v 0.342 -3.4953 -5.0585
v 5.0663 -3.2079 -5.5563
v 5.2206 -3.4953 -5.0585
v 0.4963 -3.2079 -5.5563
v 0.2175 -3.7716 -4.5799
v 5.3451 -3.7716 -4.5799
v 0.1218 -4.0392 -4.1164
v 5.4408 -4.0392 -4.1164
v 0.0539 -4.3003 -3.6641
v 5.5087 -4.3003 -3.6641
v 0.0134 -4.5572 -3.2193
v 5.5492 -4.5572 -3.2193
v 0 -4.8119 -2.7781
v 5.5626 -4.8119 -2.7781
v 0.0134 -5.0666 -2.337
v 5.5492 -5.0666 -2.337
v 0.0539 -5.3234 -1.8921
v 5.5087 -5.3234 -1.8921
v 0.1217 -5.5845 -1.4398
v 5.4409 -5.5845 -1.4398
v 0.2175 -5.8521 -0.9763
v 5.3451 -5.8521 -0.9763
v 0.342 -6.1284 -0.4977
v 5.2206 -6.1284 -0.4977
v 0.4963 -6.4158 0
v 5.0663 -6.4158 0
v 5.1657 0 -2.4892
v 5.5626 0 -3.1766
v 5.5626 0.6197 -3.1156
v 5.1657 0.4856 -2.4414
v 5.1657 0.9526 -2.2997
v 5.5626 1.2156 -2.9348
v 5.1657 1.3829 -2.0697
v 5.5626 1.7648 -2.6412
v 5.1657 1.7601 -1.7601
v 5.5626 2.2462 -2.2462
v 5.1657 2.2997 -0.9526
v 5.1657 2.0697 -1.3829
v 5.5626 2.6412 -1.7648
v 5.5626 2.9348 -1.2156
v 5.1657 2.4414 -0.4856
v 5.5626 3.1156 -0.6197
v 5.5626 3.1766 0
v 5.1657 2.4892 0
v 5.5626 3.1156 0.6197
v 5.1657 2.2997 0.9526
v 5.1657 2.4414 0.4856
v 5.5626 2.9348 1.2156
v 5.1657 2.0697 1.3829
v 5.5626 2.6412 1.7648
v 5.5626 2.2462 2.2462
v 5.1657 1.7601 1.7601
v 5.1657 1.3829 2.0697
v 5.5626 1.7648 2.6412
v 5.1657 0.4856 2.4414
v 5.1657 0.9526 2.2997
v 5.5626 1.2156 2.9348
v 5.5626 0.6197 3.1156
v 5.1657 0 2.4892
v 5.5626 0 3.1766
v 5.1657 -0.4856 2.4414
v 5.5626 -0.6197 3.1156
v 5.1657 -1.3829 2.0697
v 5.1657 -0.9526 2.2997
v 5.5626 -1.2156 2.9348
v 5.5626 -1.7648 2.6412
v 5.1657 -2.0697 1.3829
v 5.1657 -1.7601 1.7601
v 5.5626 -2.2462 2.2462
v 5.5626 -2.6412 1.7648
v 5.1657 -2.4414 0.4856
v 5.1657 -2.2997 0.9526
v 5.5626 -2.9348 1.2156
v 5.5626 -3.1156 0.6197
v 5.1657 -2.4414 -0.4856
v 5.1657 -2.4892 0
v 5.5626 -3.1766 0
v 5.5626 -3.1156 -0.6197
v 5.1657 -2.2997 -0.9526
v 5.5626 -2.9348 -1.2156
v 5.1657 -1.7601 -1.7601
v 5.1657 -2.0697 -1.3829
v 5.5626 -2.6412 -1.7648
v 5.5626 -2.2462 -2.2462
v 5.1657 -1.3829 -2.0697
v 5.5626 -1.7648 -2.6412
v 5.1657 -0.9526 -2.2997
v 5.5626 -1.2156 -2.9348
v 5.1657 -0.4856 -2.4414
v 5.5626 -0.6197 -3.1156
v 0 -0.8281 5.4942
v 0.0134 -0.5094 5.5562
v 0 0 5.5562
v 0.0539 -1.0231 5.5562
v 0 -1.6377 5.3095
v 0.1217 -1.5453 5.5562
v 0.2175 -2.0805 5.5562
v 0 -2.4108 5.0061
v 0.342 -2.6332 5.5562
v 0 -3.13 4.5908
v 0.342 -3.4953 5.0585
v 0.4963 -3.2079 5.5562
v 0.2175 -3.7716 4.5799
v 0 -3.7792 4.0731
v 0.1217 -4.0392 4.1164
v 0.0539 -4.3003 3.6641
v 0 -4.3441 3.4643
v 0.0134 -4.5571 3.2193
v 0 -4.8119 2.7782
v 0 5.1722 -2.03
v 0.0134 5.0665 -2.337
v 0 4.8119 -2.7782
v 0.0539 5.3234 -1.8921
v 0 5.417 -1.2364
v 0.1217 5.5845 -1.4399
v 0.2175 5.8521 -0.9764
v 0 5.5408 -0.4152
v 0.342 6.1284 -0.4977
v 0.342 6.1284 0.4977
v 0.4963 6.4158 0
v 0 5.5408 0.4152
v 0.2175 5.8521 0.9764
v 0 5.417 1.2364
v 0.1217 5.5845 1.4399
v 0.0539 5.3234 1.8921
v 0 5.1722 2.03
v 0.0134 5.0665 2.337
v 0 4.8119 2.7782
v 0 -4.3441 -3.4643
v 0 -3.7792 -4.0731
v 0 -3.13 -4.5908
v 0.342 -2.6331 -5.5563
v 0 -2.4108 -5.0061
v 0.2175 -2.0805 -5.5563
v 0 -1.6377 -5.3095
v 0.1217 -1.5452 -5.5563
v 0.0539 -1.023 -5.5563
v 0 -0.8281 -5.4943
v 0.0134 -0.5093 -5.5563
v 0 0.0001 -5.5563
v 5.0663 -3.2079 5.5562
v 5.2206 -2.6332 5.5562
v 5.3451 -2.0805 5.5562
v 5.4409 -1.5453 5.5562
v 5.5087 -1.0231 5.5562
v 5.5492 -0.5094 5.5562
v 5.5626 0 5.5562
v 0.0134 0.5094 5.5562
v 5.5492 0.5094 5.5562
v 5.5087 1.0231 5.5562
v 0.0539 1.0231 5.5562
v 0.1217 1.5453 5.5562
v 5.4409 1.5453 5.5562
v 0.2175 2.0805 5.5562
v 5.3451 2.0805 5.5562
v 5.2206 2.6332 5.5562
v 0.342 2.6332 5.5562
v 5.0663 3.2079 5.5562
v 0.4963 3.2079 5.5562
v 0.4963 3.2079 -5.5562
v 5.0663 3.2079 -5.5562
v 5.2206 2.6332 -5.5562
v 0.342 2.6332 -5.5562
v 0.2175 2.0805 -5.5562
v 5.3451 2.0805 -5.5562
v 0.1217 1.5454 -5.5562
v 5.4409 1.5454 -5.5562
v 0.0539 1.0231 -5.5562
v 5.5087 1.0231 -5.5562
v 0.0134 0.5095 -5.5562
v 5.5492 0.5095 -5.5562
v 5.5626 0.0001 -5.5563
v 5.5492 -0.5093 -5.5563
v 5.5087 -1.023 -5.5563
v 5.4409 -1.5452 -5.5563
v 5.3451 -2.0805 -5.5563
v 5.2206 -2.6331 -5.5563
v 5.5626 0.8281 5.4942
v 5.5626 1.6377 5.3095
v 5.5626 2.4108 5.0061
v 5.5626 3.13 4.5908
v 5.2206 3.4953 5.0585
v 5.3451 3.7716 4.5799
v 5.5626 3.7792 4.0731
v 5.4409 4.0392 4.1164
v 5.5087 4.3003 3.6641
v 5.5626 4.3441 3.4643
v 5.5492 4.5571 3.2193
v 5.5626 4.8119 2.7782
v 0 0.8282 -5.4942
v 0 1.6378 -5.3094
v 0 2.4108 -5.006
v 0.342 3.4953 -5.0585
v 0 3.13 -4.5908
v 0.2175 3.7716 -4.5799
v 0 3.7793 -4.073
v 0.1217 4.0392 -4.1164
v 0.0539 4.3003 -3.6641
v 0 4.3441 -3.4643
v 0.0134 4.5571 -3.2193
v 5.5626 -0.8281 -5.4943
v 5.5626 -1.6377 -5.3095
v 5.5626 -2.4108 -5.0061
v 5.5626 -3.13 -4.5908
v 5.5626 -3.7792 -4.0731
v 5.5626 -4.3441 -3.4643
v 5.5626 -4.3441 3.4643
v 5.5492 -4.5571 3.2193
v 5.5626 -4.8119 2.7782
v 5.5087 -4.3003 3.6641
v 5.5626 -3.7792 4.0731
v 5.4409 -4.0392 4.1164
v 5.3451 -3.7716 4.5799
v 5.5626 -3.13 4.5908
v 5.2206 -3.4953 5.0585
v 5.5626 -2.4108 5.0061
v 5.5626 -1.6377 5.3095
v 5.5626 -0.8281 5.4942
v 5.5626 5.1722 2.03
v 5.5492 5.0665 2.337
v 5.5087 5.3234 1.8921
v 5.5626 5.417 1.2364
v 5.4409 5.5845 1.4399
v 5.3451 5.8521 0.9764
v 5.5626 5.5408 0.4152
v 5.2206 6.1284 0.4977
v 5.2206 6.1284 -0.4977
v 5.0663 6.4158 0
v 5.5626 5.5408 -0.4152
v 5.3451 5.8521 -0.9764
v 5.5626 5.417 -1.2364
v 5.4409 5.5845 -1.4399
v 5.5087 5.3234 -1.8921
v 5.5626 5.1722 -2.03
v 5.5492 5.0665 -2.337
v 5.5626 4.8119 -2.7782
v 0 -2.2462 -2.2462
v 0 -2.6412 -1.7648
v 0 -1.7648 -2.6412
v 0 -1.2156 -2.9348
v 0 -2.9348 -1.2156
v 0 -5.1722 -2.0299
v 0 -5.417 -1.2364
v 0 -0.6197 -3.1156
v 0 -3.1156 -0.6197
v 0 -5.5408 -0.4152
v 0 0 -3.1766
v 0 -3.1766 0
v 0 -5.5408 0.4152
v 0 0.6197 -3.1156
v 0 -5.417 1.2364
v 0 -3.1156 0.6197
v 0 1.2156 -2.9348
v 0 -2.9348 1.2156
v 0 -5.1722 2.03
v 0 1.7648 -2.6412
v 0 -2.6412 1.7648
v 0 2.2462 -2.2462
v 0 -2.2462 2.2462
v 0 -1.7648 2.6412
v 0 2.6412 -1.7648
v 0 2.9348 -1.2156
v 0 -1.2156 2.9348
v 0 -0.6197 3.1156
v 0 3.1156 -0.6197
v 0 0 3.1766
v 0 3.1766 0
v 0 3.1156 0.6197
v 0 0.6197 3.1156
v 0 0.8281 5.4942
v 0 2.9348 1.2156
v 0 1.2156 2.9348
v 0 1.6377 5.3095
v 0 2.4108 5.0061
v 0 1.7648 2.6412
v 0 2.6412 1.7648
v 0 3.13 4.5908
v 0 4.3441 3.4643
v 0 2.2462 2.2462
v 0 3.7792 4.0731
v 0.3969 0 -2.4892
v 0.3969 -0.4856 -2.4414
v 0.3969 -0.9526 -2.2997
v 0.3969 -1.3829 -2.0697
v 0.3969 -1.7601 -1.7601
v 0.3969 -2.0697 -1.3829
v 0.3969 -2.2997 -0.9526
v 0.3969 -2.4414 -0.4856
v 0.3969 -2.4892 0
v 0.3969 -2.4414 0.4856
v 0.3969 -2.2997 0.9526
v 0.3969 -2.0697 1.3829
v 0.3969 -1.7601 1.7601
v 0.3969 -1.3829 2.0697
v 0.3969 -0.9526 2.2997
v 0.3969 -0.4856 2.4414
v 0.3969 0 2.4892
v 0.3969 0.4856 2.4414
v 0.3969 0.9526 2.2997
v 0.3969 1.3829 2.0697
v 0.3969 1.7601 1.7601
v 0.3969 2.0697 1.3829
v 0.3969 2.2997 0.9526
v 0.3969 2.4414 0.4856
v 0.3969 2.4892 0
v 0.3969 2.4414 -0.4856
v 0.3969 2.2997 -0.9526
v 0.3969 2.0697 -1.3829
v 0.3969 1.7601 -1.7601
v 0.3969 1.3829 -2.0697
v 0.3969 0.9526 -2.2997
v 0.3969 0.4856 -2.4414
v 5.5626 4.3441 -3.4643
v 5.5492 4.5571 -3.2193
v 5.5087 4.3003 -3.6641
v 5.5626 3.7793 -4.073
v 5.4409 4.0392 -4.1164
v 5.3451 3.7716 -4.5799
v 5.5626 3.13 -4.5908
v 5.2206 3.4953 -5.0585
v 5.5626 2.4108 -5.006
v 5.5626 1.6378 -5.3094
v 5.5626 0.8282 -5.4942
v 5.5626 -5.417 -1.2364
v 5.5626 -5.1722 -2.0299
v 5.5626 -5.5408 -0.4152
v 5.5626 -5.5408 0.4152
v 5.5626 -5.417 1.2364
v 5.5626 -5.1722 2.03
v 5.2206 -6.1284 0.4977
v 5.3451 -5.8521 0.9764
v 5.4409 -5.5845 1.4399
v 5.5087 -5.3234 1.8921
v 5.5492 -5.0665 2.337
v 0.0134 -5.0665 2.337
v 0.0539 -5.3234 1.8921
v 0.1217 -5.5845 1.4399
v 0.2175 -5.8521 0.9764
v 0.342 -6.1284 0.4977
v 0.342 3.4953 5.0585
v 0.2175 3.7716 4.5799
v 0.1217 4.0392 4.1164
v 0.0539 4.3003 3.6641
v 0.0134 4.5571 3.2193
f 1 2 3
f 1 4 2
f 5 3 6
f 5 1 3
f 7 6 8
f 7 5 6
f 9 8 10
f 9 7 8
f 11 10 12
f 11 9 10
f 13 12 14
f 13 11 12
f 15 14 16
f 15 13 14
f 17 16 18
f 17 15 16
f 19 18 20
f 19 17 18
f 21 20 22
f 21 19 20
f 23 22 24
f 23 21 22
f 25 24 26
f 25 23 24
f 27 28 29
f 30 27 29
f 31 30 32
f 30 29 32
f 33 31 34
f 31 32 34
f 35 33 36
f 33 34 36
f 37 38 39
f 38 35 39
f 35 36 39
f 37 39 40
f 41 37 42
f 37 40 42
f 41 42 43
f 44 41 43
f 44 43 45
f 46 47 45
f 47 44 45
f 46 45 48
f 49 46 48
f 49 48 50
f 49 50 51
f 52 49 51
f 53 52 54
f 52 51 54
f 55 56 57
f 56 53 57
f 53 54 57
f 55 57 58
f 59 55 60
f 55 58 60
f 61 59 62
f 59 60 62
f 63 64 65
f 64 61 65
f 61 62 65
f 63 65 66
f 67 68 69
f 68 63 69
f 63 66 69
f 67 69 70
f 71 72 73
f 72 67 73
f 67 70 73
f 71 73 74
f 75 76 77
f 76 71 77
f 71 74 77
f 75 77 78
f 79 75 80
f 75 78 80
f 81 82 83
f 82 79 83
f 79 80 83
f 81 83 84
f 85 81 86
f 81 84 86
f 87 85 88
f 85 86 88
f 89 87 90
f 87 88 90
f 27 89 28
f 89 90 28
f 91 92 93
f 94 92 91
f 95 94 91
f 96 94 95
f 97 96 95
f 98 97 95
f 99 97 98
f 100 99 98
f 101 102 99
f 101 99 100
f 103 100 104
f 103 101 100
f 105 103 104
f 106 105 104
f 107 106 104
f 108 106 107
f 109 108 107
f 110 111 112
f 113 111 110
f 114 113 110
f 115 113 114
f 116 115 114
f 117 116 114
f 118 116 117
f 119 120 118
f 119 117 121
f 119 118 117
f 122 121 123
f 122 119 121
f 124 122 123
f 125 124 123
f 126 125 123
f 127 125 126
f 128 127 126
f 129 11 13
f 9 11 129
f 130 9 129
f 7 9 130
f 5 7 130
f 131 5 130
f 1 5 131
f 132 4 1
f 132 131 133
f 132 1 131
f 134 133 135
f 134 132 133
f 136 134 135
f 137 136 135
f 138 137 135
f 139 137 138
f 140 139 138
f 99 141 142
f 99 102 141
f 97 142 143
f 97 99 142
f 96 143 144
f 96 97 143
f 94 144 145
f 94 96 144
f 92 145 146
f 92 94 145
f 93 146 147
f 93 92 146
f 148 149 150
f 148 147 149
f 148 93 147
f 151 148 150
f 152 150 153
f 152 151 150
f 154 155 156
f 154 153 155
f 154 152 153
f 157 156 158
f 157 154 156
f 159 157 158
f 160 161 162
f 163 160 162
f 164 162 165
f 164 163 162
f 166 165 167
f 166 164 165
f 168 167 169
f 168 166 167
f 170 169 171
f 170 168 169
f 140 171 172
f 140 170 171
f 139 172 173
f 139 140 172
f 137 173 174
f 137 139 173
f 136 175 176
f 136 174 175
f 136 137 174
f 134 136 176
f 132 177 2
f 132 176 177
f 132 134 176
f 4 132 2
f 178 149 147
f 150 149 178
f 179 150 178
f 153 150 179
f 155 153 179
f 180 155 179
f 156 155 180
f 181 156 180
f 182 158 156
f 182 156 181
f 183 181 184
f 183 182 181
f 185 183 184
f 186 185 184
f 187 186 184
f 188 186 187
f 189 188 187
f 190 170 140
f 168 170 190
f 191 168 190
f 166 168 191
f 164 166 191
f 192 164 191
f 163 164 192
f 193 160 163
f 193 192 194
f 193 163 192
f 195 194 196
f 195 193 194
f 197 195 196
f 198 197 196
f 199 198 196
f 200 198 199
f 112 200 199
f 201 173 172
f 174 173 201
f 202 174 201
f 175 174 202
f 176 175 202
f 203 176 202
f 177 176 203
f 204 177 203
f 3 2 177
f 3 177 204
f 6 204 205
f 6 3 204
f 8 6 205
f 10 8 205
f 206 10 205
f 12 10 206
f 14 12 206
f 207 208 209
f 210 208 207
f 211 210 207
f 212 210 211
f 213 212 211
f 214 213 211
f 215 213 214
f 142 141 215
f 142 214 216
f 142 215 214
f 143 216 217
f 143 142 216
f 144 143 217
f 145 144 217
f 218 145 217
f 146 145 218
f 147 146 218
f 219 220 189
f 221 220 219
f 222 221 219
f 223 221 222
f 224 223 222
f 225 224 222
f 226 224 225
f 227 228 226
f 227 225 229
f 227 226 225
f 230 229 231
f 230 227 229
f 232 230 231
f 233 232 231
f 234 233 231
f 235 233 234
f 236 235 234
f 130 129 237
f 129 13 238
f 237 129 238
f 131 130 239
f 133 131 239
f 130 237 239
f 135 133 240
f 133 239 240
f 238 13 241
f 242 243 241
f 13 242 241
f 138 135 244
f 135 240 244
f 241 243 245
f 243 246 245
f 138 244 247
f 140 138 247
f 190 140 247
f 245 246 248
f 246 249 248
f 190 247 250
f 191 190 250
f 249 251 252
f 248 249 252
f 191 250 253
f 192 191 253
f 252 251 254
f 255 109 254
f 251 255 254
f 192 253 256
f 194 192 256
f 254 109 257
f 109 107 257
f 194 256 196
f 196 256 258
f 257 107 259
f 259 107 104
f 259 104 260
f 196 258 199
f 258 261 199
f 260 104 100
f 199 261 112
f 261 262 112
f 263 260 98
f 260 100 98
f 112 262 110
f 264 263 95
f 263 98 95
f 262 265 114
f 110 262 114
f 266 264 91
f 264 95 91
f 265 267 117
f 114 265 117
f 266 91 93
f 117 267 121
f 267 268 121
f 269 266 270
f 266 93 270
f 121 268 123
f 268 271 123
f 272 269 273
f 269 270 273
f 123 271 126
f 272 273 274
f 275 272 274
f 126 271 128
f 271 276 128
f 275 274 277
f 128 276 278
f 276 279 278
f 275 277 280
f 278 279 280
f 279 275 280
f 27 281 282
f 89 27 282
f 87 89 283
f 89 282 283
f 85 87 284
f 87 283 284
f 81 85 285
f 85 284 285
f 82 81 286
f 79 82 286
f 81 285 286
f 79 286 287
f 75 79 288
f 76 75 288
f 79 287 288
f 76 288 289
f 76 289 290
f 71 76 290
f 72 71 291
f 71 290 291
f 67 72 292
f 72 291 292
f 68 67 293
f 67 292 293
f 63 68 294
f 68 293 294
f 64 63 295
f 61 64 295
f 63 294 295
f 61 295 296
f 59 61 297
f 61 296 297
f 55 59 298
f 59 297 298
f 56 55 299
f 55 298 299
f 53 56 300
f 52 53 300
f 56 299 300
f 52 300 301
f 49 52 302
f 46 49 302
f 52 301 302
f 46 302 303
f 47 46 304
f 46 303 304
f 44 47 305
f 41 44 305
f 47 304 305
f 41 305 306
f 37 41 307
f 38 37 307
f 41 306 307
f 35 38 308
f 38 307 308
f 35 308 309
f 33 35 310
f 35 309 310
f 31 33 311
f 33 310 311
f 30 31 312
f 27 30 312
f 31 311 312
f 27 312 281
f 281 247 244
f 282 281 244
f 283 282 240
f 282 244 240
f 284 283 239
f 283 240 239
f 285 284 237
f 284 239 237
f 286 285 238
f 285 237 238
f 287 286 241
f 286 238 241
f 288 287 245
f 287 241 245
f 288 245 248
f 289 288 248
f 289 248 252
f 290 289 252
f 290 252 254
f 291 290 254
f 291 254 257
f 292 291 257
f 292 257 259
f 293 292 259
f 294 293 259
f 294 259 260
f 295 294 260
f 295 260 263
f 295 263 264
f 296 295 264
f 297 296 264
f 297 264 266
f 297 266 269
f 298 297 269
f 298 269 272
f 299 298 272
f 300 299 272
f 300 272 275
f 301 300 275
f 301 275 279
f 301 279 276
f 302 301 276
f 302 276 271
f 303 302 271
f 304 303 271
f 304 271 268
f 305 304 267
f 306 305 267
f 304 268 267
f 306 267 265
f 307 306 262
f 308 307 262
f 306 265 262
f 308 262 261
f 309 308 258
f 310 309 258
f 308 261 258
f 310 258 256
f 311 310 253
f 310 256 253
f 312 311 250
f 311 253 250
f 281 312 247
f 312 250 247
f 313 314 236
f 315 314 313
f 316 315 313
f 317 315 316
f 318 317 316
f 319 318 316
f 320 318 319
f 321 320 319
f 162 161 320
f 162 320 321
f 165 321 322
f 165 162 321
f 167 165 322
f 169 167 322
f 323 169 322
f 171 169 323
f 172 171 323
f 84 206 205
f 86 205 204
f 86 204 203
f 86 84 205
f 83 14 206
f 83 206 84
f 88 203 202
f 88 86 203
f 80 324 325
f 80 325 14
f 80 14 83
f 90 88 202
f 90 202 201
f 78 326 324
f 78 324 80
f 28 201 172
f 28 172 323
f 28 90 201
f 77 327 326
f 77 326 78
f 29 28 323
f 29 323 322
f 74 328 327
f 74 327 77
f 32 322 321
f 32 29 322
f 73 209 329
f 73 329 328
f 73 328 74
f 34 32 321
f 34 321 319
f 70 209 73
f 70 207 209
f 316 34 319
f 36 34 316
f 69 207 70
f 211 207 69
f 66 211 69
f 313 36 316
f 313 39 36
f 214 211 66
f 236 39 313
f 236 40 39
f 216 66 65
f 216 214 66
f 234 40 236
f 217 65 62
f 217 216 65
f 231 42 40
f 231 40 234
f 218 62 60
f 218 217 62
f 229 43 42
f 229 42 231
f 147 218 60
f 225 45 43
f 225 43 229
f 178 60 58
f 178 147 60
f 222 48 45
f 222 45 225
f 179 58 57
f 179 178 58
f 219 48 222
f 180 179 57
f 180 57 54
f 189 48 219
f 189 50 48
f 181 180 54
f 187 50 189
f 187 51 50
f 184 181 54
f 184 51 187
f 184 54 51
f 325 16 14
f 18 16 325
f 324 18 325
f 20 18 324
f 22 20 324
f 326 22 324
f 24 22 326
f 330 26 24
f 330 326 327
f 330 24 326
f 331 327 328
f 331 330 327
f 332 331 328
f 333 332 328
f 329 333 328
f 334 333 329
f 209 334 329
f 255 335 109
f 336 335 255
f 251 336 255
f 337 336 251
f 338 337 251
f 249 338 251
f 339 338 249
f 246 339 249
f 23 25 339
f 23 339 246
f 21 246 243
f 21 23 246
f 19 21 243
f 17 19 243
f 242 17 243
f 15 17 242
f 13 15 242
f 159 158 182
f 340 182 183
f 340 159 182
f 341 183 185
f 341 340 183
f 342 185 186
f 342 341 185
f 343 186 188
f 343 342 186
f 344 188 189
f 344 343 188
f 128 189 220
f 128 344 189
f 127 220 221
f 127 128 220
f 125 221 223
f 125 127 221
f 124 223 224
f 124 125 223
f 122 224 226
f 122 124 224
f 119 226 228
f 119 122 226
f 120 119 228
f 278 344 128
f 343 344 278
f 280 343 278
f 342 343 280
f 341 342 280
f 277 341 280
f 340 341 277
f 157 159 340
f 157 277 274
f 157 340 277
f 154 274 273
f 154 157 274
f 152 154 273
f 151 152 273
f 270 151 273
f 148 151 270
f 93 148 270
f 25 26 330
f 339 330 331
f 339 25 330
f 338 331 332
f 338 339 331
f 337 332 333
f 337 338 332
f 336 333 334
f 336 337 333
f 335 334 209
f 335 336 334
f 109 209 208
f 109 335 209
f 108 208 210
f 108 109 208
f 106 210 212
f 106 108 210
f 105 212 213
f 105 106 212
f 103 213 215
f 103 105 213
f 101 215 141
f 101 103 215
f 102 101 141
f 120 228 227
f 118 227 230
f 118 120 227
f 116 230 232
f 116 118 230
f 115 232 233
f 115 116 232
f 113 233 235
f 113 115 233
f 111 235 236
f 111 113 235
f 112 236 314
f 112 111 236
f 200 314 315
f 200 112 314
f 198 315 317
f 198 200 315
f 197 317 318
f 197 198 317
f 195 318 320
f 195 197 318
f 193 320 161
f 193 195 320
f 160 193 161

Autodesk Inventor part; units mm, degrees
ref_plane "YZ Plane" through (0, 0, 0) normal (1, 0, 0) x (0, 1, 0)
ref_plane "XZ Plane" through (0, 0, 0) normal (0, 1, 0) x (-1, 0, 0)
ref_plane "XY Plane" through (0, 0, 0) normal (0, 0, 1) x (1, 0, 0)
sketch "Sketch1" plane through (0, 0, 0) normal (1, 0, 0) x (0, 1, 0)
  line L0 (-6.4158, 0) -> (-3.2079, 5.5562)
  line L1 (-3.2079, 5.5562) -> (3.2079, 5.5562)
  line L2 (3.2079, 5.5562) -> (6.4158, 0)
  line L3 (6.4158, 0) -> (3.2079, -5.5562)
  line L4 (3.2079, -5.5562) -> (-3.2079, -5.5563)
  line L5 (-3.2079, -5.5563) -> (-6.4158, 0)
  point P0 (0, 0)
  point P1 (0, 0)
  dimension "d0" = 12.8316
extrude "Body" add sketch "Sketch1" along normal blind 5.5626
sketch "Sketch2" plane through (0, 0, 0) normal (0, 0, 1) x (1, 0, 0)
  line L0 (0, 3.2079) -> (0, 6.4158) projected
  line L1 (0, 6.4158) -> (5.5626, 6.4158) projected
  line L2 (5.5626, 3.2079) -> (5.5626, 6.4158) projected
  line L3 (-0.5563, 0) -> (7.2314, 0) projected
  line L4 (0.4963, 6.4158) -> (0, 5.5563)
  line L5 (5.0663, 6.4158) -> (5.5626, 5.5563)
  dimension "d3" = 30
  dimension "d4" = 30
  dimension "d5" = 11.1125
  dimension "d6" = 11.1125
revolve "Chamfer1" cut sketch "Sketch2" angle 360 about axis through (-10, 0, 0) along (1, 0, 0)
sketch "Sketch3" plane through (5.5626, 0, 0) normal (1, 0, 0) x (0, 0, -1)
  arc A0 (-2.7781, -4.8119) -> (2.7781, -4.8119) centre (0, 0) ccw projected
hole "Thread" at (5.5626, 0, 0) direction (-1, 0, 0) diameter 4.9784 end through all thread size "1/4-20 UNC" class "2B" standard "ANSI Unified Screw Threads"
chamfer "Chamfer2" distance 0.6874 angle 30 1 edges at (5.5626, 0, 2.4892) measured on face at (5.5626, 4.5076, -0.1)
chamfer "Chamfer3" distance 0.6874 angle 30 1 edges at (0, 0, 2.4892) measured on face at (0, 4.5076, -0.1)
equation "\"d0\" = 1.1547 * SW"
equation "\"d1\" = KOH"
equation "\"d3\" = ANG1"
equation "\"d4\" = ANG2"
equation "\"d5\" = SW0"
equation "\"d6\" = SW01"
equation "\"d8\" = -0.5 * GD1 + 0.5 * NND"
equation "\"d40\" = -0.5 * GD1 + 0.5 * NND"
equation "\"d10\" = -0.5 * GD1 + 0.5 * NND"
equation "\"d41\" = -0.5 * GD1 + 0.5 * NND"
equation "\"ANG1\" = 30deg"
equation "\"ANG2\" = 30deg"
equation "\"NND\" = 6.35"
equation "\"KOH\" = 5.5626"
equation "\"SW\" = 11.1125"
equation "\"SW0\" = SW"
equation "\"SW01\" = SW"
equation "\"TOA\" = 30deg"
equation "\"THREADDIA\" = 6.35"
equation "\"E0\" = 1.155 * SW"
equation "\"GD1\" = 4.975185"
properties part number "ANSI B18.2.2 - 1/4 - 20" material "Steel, High Strength Low Alloy"
